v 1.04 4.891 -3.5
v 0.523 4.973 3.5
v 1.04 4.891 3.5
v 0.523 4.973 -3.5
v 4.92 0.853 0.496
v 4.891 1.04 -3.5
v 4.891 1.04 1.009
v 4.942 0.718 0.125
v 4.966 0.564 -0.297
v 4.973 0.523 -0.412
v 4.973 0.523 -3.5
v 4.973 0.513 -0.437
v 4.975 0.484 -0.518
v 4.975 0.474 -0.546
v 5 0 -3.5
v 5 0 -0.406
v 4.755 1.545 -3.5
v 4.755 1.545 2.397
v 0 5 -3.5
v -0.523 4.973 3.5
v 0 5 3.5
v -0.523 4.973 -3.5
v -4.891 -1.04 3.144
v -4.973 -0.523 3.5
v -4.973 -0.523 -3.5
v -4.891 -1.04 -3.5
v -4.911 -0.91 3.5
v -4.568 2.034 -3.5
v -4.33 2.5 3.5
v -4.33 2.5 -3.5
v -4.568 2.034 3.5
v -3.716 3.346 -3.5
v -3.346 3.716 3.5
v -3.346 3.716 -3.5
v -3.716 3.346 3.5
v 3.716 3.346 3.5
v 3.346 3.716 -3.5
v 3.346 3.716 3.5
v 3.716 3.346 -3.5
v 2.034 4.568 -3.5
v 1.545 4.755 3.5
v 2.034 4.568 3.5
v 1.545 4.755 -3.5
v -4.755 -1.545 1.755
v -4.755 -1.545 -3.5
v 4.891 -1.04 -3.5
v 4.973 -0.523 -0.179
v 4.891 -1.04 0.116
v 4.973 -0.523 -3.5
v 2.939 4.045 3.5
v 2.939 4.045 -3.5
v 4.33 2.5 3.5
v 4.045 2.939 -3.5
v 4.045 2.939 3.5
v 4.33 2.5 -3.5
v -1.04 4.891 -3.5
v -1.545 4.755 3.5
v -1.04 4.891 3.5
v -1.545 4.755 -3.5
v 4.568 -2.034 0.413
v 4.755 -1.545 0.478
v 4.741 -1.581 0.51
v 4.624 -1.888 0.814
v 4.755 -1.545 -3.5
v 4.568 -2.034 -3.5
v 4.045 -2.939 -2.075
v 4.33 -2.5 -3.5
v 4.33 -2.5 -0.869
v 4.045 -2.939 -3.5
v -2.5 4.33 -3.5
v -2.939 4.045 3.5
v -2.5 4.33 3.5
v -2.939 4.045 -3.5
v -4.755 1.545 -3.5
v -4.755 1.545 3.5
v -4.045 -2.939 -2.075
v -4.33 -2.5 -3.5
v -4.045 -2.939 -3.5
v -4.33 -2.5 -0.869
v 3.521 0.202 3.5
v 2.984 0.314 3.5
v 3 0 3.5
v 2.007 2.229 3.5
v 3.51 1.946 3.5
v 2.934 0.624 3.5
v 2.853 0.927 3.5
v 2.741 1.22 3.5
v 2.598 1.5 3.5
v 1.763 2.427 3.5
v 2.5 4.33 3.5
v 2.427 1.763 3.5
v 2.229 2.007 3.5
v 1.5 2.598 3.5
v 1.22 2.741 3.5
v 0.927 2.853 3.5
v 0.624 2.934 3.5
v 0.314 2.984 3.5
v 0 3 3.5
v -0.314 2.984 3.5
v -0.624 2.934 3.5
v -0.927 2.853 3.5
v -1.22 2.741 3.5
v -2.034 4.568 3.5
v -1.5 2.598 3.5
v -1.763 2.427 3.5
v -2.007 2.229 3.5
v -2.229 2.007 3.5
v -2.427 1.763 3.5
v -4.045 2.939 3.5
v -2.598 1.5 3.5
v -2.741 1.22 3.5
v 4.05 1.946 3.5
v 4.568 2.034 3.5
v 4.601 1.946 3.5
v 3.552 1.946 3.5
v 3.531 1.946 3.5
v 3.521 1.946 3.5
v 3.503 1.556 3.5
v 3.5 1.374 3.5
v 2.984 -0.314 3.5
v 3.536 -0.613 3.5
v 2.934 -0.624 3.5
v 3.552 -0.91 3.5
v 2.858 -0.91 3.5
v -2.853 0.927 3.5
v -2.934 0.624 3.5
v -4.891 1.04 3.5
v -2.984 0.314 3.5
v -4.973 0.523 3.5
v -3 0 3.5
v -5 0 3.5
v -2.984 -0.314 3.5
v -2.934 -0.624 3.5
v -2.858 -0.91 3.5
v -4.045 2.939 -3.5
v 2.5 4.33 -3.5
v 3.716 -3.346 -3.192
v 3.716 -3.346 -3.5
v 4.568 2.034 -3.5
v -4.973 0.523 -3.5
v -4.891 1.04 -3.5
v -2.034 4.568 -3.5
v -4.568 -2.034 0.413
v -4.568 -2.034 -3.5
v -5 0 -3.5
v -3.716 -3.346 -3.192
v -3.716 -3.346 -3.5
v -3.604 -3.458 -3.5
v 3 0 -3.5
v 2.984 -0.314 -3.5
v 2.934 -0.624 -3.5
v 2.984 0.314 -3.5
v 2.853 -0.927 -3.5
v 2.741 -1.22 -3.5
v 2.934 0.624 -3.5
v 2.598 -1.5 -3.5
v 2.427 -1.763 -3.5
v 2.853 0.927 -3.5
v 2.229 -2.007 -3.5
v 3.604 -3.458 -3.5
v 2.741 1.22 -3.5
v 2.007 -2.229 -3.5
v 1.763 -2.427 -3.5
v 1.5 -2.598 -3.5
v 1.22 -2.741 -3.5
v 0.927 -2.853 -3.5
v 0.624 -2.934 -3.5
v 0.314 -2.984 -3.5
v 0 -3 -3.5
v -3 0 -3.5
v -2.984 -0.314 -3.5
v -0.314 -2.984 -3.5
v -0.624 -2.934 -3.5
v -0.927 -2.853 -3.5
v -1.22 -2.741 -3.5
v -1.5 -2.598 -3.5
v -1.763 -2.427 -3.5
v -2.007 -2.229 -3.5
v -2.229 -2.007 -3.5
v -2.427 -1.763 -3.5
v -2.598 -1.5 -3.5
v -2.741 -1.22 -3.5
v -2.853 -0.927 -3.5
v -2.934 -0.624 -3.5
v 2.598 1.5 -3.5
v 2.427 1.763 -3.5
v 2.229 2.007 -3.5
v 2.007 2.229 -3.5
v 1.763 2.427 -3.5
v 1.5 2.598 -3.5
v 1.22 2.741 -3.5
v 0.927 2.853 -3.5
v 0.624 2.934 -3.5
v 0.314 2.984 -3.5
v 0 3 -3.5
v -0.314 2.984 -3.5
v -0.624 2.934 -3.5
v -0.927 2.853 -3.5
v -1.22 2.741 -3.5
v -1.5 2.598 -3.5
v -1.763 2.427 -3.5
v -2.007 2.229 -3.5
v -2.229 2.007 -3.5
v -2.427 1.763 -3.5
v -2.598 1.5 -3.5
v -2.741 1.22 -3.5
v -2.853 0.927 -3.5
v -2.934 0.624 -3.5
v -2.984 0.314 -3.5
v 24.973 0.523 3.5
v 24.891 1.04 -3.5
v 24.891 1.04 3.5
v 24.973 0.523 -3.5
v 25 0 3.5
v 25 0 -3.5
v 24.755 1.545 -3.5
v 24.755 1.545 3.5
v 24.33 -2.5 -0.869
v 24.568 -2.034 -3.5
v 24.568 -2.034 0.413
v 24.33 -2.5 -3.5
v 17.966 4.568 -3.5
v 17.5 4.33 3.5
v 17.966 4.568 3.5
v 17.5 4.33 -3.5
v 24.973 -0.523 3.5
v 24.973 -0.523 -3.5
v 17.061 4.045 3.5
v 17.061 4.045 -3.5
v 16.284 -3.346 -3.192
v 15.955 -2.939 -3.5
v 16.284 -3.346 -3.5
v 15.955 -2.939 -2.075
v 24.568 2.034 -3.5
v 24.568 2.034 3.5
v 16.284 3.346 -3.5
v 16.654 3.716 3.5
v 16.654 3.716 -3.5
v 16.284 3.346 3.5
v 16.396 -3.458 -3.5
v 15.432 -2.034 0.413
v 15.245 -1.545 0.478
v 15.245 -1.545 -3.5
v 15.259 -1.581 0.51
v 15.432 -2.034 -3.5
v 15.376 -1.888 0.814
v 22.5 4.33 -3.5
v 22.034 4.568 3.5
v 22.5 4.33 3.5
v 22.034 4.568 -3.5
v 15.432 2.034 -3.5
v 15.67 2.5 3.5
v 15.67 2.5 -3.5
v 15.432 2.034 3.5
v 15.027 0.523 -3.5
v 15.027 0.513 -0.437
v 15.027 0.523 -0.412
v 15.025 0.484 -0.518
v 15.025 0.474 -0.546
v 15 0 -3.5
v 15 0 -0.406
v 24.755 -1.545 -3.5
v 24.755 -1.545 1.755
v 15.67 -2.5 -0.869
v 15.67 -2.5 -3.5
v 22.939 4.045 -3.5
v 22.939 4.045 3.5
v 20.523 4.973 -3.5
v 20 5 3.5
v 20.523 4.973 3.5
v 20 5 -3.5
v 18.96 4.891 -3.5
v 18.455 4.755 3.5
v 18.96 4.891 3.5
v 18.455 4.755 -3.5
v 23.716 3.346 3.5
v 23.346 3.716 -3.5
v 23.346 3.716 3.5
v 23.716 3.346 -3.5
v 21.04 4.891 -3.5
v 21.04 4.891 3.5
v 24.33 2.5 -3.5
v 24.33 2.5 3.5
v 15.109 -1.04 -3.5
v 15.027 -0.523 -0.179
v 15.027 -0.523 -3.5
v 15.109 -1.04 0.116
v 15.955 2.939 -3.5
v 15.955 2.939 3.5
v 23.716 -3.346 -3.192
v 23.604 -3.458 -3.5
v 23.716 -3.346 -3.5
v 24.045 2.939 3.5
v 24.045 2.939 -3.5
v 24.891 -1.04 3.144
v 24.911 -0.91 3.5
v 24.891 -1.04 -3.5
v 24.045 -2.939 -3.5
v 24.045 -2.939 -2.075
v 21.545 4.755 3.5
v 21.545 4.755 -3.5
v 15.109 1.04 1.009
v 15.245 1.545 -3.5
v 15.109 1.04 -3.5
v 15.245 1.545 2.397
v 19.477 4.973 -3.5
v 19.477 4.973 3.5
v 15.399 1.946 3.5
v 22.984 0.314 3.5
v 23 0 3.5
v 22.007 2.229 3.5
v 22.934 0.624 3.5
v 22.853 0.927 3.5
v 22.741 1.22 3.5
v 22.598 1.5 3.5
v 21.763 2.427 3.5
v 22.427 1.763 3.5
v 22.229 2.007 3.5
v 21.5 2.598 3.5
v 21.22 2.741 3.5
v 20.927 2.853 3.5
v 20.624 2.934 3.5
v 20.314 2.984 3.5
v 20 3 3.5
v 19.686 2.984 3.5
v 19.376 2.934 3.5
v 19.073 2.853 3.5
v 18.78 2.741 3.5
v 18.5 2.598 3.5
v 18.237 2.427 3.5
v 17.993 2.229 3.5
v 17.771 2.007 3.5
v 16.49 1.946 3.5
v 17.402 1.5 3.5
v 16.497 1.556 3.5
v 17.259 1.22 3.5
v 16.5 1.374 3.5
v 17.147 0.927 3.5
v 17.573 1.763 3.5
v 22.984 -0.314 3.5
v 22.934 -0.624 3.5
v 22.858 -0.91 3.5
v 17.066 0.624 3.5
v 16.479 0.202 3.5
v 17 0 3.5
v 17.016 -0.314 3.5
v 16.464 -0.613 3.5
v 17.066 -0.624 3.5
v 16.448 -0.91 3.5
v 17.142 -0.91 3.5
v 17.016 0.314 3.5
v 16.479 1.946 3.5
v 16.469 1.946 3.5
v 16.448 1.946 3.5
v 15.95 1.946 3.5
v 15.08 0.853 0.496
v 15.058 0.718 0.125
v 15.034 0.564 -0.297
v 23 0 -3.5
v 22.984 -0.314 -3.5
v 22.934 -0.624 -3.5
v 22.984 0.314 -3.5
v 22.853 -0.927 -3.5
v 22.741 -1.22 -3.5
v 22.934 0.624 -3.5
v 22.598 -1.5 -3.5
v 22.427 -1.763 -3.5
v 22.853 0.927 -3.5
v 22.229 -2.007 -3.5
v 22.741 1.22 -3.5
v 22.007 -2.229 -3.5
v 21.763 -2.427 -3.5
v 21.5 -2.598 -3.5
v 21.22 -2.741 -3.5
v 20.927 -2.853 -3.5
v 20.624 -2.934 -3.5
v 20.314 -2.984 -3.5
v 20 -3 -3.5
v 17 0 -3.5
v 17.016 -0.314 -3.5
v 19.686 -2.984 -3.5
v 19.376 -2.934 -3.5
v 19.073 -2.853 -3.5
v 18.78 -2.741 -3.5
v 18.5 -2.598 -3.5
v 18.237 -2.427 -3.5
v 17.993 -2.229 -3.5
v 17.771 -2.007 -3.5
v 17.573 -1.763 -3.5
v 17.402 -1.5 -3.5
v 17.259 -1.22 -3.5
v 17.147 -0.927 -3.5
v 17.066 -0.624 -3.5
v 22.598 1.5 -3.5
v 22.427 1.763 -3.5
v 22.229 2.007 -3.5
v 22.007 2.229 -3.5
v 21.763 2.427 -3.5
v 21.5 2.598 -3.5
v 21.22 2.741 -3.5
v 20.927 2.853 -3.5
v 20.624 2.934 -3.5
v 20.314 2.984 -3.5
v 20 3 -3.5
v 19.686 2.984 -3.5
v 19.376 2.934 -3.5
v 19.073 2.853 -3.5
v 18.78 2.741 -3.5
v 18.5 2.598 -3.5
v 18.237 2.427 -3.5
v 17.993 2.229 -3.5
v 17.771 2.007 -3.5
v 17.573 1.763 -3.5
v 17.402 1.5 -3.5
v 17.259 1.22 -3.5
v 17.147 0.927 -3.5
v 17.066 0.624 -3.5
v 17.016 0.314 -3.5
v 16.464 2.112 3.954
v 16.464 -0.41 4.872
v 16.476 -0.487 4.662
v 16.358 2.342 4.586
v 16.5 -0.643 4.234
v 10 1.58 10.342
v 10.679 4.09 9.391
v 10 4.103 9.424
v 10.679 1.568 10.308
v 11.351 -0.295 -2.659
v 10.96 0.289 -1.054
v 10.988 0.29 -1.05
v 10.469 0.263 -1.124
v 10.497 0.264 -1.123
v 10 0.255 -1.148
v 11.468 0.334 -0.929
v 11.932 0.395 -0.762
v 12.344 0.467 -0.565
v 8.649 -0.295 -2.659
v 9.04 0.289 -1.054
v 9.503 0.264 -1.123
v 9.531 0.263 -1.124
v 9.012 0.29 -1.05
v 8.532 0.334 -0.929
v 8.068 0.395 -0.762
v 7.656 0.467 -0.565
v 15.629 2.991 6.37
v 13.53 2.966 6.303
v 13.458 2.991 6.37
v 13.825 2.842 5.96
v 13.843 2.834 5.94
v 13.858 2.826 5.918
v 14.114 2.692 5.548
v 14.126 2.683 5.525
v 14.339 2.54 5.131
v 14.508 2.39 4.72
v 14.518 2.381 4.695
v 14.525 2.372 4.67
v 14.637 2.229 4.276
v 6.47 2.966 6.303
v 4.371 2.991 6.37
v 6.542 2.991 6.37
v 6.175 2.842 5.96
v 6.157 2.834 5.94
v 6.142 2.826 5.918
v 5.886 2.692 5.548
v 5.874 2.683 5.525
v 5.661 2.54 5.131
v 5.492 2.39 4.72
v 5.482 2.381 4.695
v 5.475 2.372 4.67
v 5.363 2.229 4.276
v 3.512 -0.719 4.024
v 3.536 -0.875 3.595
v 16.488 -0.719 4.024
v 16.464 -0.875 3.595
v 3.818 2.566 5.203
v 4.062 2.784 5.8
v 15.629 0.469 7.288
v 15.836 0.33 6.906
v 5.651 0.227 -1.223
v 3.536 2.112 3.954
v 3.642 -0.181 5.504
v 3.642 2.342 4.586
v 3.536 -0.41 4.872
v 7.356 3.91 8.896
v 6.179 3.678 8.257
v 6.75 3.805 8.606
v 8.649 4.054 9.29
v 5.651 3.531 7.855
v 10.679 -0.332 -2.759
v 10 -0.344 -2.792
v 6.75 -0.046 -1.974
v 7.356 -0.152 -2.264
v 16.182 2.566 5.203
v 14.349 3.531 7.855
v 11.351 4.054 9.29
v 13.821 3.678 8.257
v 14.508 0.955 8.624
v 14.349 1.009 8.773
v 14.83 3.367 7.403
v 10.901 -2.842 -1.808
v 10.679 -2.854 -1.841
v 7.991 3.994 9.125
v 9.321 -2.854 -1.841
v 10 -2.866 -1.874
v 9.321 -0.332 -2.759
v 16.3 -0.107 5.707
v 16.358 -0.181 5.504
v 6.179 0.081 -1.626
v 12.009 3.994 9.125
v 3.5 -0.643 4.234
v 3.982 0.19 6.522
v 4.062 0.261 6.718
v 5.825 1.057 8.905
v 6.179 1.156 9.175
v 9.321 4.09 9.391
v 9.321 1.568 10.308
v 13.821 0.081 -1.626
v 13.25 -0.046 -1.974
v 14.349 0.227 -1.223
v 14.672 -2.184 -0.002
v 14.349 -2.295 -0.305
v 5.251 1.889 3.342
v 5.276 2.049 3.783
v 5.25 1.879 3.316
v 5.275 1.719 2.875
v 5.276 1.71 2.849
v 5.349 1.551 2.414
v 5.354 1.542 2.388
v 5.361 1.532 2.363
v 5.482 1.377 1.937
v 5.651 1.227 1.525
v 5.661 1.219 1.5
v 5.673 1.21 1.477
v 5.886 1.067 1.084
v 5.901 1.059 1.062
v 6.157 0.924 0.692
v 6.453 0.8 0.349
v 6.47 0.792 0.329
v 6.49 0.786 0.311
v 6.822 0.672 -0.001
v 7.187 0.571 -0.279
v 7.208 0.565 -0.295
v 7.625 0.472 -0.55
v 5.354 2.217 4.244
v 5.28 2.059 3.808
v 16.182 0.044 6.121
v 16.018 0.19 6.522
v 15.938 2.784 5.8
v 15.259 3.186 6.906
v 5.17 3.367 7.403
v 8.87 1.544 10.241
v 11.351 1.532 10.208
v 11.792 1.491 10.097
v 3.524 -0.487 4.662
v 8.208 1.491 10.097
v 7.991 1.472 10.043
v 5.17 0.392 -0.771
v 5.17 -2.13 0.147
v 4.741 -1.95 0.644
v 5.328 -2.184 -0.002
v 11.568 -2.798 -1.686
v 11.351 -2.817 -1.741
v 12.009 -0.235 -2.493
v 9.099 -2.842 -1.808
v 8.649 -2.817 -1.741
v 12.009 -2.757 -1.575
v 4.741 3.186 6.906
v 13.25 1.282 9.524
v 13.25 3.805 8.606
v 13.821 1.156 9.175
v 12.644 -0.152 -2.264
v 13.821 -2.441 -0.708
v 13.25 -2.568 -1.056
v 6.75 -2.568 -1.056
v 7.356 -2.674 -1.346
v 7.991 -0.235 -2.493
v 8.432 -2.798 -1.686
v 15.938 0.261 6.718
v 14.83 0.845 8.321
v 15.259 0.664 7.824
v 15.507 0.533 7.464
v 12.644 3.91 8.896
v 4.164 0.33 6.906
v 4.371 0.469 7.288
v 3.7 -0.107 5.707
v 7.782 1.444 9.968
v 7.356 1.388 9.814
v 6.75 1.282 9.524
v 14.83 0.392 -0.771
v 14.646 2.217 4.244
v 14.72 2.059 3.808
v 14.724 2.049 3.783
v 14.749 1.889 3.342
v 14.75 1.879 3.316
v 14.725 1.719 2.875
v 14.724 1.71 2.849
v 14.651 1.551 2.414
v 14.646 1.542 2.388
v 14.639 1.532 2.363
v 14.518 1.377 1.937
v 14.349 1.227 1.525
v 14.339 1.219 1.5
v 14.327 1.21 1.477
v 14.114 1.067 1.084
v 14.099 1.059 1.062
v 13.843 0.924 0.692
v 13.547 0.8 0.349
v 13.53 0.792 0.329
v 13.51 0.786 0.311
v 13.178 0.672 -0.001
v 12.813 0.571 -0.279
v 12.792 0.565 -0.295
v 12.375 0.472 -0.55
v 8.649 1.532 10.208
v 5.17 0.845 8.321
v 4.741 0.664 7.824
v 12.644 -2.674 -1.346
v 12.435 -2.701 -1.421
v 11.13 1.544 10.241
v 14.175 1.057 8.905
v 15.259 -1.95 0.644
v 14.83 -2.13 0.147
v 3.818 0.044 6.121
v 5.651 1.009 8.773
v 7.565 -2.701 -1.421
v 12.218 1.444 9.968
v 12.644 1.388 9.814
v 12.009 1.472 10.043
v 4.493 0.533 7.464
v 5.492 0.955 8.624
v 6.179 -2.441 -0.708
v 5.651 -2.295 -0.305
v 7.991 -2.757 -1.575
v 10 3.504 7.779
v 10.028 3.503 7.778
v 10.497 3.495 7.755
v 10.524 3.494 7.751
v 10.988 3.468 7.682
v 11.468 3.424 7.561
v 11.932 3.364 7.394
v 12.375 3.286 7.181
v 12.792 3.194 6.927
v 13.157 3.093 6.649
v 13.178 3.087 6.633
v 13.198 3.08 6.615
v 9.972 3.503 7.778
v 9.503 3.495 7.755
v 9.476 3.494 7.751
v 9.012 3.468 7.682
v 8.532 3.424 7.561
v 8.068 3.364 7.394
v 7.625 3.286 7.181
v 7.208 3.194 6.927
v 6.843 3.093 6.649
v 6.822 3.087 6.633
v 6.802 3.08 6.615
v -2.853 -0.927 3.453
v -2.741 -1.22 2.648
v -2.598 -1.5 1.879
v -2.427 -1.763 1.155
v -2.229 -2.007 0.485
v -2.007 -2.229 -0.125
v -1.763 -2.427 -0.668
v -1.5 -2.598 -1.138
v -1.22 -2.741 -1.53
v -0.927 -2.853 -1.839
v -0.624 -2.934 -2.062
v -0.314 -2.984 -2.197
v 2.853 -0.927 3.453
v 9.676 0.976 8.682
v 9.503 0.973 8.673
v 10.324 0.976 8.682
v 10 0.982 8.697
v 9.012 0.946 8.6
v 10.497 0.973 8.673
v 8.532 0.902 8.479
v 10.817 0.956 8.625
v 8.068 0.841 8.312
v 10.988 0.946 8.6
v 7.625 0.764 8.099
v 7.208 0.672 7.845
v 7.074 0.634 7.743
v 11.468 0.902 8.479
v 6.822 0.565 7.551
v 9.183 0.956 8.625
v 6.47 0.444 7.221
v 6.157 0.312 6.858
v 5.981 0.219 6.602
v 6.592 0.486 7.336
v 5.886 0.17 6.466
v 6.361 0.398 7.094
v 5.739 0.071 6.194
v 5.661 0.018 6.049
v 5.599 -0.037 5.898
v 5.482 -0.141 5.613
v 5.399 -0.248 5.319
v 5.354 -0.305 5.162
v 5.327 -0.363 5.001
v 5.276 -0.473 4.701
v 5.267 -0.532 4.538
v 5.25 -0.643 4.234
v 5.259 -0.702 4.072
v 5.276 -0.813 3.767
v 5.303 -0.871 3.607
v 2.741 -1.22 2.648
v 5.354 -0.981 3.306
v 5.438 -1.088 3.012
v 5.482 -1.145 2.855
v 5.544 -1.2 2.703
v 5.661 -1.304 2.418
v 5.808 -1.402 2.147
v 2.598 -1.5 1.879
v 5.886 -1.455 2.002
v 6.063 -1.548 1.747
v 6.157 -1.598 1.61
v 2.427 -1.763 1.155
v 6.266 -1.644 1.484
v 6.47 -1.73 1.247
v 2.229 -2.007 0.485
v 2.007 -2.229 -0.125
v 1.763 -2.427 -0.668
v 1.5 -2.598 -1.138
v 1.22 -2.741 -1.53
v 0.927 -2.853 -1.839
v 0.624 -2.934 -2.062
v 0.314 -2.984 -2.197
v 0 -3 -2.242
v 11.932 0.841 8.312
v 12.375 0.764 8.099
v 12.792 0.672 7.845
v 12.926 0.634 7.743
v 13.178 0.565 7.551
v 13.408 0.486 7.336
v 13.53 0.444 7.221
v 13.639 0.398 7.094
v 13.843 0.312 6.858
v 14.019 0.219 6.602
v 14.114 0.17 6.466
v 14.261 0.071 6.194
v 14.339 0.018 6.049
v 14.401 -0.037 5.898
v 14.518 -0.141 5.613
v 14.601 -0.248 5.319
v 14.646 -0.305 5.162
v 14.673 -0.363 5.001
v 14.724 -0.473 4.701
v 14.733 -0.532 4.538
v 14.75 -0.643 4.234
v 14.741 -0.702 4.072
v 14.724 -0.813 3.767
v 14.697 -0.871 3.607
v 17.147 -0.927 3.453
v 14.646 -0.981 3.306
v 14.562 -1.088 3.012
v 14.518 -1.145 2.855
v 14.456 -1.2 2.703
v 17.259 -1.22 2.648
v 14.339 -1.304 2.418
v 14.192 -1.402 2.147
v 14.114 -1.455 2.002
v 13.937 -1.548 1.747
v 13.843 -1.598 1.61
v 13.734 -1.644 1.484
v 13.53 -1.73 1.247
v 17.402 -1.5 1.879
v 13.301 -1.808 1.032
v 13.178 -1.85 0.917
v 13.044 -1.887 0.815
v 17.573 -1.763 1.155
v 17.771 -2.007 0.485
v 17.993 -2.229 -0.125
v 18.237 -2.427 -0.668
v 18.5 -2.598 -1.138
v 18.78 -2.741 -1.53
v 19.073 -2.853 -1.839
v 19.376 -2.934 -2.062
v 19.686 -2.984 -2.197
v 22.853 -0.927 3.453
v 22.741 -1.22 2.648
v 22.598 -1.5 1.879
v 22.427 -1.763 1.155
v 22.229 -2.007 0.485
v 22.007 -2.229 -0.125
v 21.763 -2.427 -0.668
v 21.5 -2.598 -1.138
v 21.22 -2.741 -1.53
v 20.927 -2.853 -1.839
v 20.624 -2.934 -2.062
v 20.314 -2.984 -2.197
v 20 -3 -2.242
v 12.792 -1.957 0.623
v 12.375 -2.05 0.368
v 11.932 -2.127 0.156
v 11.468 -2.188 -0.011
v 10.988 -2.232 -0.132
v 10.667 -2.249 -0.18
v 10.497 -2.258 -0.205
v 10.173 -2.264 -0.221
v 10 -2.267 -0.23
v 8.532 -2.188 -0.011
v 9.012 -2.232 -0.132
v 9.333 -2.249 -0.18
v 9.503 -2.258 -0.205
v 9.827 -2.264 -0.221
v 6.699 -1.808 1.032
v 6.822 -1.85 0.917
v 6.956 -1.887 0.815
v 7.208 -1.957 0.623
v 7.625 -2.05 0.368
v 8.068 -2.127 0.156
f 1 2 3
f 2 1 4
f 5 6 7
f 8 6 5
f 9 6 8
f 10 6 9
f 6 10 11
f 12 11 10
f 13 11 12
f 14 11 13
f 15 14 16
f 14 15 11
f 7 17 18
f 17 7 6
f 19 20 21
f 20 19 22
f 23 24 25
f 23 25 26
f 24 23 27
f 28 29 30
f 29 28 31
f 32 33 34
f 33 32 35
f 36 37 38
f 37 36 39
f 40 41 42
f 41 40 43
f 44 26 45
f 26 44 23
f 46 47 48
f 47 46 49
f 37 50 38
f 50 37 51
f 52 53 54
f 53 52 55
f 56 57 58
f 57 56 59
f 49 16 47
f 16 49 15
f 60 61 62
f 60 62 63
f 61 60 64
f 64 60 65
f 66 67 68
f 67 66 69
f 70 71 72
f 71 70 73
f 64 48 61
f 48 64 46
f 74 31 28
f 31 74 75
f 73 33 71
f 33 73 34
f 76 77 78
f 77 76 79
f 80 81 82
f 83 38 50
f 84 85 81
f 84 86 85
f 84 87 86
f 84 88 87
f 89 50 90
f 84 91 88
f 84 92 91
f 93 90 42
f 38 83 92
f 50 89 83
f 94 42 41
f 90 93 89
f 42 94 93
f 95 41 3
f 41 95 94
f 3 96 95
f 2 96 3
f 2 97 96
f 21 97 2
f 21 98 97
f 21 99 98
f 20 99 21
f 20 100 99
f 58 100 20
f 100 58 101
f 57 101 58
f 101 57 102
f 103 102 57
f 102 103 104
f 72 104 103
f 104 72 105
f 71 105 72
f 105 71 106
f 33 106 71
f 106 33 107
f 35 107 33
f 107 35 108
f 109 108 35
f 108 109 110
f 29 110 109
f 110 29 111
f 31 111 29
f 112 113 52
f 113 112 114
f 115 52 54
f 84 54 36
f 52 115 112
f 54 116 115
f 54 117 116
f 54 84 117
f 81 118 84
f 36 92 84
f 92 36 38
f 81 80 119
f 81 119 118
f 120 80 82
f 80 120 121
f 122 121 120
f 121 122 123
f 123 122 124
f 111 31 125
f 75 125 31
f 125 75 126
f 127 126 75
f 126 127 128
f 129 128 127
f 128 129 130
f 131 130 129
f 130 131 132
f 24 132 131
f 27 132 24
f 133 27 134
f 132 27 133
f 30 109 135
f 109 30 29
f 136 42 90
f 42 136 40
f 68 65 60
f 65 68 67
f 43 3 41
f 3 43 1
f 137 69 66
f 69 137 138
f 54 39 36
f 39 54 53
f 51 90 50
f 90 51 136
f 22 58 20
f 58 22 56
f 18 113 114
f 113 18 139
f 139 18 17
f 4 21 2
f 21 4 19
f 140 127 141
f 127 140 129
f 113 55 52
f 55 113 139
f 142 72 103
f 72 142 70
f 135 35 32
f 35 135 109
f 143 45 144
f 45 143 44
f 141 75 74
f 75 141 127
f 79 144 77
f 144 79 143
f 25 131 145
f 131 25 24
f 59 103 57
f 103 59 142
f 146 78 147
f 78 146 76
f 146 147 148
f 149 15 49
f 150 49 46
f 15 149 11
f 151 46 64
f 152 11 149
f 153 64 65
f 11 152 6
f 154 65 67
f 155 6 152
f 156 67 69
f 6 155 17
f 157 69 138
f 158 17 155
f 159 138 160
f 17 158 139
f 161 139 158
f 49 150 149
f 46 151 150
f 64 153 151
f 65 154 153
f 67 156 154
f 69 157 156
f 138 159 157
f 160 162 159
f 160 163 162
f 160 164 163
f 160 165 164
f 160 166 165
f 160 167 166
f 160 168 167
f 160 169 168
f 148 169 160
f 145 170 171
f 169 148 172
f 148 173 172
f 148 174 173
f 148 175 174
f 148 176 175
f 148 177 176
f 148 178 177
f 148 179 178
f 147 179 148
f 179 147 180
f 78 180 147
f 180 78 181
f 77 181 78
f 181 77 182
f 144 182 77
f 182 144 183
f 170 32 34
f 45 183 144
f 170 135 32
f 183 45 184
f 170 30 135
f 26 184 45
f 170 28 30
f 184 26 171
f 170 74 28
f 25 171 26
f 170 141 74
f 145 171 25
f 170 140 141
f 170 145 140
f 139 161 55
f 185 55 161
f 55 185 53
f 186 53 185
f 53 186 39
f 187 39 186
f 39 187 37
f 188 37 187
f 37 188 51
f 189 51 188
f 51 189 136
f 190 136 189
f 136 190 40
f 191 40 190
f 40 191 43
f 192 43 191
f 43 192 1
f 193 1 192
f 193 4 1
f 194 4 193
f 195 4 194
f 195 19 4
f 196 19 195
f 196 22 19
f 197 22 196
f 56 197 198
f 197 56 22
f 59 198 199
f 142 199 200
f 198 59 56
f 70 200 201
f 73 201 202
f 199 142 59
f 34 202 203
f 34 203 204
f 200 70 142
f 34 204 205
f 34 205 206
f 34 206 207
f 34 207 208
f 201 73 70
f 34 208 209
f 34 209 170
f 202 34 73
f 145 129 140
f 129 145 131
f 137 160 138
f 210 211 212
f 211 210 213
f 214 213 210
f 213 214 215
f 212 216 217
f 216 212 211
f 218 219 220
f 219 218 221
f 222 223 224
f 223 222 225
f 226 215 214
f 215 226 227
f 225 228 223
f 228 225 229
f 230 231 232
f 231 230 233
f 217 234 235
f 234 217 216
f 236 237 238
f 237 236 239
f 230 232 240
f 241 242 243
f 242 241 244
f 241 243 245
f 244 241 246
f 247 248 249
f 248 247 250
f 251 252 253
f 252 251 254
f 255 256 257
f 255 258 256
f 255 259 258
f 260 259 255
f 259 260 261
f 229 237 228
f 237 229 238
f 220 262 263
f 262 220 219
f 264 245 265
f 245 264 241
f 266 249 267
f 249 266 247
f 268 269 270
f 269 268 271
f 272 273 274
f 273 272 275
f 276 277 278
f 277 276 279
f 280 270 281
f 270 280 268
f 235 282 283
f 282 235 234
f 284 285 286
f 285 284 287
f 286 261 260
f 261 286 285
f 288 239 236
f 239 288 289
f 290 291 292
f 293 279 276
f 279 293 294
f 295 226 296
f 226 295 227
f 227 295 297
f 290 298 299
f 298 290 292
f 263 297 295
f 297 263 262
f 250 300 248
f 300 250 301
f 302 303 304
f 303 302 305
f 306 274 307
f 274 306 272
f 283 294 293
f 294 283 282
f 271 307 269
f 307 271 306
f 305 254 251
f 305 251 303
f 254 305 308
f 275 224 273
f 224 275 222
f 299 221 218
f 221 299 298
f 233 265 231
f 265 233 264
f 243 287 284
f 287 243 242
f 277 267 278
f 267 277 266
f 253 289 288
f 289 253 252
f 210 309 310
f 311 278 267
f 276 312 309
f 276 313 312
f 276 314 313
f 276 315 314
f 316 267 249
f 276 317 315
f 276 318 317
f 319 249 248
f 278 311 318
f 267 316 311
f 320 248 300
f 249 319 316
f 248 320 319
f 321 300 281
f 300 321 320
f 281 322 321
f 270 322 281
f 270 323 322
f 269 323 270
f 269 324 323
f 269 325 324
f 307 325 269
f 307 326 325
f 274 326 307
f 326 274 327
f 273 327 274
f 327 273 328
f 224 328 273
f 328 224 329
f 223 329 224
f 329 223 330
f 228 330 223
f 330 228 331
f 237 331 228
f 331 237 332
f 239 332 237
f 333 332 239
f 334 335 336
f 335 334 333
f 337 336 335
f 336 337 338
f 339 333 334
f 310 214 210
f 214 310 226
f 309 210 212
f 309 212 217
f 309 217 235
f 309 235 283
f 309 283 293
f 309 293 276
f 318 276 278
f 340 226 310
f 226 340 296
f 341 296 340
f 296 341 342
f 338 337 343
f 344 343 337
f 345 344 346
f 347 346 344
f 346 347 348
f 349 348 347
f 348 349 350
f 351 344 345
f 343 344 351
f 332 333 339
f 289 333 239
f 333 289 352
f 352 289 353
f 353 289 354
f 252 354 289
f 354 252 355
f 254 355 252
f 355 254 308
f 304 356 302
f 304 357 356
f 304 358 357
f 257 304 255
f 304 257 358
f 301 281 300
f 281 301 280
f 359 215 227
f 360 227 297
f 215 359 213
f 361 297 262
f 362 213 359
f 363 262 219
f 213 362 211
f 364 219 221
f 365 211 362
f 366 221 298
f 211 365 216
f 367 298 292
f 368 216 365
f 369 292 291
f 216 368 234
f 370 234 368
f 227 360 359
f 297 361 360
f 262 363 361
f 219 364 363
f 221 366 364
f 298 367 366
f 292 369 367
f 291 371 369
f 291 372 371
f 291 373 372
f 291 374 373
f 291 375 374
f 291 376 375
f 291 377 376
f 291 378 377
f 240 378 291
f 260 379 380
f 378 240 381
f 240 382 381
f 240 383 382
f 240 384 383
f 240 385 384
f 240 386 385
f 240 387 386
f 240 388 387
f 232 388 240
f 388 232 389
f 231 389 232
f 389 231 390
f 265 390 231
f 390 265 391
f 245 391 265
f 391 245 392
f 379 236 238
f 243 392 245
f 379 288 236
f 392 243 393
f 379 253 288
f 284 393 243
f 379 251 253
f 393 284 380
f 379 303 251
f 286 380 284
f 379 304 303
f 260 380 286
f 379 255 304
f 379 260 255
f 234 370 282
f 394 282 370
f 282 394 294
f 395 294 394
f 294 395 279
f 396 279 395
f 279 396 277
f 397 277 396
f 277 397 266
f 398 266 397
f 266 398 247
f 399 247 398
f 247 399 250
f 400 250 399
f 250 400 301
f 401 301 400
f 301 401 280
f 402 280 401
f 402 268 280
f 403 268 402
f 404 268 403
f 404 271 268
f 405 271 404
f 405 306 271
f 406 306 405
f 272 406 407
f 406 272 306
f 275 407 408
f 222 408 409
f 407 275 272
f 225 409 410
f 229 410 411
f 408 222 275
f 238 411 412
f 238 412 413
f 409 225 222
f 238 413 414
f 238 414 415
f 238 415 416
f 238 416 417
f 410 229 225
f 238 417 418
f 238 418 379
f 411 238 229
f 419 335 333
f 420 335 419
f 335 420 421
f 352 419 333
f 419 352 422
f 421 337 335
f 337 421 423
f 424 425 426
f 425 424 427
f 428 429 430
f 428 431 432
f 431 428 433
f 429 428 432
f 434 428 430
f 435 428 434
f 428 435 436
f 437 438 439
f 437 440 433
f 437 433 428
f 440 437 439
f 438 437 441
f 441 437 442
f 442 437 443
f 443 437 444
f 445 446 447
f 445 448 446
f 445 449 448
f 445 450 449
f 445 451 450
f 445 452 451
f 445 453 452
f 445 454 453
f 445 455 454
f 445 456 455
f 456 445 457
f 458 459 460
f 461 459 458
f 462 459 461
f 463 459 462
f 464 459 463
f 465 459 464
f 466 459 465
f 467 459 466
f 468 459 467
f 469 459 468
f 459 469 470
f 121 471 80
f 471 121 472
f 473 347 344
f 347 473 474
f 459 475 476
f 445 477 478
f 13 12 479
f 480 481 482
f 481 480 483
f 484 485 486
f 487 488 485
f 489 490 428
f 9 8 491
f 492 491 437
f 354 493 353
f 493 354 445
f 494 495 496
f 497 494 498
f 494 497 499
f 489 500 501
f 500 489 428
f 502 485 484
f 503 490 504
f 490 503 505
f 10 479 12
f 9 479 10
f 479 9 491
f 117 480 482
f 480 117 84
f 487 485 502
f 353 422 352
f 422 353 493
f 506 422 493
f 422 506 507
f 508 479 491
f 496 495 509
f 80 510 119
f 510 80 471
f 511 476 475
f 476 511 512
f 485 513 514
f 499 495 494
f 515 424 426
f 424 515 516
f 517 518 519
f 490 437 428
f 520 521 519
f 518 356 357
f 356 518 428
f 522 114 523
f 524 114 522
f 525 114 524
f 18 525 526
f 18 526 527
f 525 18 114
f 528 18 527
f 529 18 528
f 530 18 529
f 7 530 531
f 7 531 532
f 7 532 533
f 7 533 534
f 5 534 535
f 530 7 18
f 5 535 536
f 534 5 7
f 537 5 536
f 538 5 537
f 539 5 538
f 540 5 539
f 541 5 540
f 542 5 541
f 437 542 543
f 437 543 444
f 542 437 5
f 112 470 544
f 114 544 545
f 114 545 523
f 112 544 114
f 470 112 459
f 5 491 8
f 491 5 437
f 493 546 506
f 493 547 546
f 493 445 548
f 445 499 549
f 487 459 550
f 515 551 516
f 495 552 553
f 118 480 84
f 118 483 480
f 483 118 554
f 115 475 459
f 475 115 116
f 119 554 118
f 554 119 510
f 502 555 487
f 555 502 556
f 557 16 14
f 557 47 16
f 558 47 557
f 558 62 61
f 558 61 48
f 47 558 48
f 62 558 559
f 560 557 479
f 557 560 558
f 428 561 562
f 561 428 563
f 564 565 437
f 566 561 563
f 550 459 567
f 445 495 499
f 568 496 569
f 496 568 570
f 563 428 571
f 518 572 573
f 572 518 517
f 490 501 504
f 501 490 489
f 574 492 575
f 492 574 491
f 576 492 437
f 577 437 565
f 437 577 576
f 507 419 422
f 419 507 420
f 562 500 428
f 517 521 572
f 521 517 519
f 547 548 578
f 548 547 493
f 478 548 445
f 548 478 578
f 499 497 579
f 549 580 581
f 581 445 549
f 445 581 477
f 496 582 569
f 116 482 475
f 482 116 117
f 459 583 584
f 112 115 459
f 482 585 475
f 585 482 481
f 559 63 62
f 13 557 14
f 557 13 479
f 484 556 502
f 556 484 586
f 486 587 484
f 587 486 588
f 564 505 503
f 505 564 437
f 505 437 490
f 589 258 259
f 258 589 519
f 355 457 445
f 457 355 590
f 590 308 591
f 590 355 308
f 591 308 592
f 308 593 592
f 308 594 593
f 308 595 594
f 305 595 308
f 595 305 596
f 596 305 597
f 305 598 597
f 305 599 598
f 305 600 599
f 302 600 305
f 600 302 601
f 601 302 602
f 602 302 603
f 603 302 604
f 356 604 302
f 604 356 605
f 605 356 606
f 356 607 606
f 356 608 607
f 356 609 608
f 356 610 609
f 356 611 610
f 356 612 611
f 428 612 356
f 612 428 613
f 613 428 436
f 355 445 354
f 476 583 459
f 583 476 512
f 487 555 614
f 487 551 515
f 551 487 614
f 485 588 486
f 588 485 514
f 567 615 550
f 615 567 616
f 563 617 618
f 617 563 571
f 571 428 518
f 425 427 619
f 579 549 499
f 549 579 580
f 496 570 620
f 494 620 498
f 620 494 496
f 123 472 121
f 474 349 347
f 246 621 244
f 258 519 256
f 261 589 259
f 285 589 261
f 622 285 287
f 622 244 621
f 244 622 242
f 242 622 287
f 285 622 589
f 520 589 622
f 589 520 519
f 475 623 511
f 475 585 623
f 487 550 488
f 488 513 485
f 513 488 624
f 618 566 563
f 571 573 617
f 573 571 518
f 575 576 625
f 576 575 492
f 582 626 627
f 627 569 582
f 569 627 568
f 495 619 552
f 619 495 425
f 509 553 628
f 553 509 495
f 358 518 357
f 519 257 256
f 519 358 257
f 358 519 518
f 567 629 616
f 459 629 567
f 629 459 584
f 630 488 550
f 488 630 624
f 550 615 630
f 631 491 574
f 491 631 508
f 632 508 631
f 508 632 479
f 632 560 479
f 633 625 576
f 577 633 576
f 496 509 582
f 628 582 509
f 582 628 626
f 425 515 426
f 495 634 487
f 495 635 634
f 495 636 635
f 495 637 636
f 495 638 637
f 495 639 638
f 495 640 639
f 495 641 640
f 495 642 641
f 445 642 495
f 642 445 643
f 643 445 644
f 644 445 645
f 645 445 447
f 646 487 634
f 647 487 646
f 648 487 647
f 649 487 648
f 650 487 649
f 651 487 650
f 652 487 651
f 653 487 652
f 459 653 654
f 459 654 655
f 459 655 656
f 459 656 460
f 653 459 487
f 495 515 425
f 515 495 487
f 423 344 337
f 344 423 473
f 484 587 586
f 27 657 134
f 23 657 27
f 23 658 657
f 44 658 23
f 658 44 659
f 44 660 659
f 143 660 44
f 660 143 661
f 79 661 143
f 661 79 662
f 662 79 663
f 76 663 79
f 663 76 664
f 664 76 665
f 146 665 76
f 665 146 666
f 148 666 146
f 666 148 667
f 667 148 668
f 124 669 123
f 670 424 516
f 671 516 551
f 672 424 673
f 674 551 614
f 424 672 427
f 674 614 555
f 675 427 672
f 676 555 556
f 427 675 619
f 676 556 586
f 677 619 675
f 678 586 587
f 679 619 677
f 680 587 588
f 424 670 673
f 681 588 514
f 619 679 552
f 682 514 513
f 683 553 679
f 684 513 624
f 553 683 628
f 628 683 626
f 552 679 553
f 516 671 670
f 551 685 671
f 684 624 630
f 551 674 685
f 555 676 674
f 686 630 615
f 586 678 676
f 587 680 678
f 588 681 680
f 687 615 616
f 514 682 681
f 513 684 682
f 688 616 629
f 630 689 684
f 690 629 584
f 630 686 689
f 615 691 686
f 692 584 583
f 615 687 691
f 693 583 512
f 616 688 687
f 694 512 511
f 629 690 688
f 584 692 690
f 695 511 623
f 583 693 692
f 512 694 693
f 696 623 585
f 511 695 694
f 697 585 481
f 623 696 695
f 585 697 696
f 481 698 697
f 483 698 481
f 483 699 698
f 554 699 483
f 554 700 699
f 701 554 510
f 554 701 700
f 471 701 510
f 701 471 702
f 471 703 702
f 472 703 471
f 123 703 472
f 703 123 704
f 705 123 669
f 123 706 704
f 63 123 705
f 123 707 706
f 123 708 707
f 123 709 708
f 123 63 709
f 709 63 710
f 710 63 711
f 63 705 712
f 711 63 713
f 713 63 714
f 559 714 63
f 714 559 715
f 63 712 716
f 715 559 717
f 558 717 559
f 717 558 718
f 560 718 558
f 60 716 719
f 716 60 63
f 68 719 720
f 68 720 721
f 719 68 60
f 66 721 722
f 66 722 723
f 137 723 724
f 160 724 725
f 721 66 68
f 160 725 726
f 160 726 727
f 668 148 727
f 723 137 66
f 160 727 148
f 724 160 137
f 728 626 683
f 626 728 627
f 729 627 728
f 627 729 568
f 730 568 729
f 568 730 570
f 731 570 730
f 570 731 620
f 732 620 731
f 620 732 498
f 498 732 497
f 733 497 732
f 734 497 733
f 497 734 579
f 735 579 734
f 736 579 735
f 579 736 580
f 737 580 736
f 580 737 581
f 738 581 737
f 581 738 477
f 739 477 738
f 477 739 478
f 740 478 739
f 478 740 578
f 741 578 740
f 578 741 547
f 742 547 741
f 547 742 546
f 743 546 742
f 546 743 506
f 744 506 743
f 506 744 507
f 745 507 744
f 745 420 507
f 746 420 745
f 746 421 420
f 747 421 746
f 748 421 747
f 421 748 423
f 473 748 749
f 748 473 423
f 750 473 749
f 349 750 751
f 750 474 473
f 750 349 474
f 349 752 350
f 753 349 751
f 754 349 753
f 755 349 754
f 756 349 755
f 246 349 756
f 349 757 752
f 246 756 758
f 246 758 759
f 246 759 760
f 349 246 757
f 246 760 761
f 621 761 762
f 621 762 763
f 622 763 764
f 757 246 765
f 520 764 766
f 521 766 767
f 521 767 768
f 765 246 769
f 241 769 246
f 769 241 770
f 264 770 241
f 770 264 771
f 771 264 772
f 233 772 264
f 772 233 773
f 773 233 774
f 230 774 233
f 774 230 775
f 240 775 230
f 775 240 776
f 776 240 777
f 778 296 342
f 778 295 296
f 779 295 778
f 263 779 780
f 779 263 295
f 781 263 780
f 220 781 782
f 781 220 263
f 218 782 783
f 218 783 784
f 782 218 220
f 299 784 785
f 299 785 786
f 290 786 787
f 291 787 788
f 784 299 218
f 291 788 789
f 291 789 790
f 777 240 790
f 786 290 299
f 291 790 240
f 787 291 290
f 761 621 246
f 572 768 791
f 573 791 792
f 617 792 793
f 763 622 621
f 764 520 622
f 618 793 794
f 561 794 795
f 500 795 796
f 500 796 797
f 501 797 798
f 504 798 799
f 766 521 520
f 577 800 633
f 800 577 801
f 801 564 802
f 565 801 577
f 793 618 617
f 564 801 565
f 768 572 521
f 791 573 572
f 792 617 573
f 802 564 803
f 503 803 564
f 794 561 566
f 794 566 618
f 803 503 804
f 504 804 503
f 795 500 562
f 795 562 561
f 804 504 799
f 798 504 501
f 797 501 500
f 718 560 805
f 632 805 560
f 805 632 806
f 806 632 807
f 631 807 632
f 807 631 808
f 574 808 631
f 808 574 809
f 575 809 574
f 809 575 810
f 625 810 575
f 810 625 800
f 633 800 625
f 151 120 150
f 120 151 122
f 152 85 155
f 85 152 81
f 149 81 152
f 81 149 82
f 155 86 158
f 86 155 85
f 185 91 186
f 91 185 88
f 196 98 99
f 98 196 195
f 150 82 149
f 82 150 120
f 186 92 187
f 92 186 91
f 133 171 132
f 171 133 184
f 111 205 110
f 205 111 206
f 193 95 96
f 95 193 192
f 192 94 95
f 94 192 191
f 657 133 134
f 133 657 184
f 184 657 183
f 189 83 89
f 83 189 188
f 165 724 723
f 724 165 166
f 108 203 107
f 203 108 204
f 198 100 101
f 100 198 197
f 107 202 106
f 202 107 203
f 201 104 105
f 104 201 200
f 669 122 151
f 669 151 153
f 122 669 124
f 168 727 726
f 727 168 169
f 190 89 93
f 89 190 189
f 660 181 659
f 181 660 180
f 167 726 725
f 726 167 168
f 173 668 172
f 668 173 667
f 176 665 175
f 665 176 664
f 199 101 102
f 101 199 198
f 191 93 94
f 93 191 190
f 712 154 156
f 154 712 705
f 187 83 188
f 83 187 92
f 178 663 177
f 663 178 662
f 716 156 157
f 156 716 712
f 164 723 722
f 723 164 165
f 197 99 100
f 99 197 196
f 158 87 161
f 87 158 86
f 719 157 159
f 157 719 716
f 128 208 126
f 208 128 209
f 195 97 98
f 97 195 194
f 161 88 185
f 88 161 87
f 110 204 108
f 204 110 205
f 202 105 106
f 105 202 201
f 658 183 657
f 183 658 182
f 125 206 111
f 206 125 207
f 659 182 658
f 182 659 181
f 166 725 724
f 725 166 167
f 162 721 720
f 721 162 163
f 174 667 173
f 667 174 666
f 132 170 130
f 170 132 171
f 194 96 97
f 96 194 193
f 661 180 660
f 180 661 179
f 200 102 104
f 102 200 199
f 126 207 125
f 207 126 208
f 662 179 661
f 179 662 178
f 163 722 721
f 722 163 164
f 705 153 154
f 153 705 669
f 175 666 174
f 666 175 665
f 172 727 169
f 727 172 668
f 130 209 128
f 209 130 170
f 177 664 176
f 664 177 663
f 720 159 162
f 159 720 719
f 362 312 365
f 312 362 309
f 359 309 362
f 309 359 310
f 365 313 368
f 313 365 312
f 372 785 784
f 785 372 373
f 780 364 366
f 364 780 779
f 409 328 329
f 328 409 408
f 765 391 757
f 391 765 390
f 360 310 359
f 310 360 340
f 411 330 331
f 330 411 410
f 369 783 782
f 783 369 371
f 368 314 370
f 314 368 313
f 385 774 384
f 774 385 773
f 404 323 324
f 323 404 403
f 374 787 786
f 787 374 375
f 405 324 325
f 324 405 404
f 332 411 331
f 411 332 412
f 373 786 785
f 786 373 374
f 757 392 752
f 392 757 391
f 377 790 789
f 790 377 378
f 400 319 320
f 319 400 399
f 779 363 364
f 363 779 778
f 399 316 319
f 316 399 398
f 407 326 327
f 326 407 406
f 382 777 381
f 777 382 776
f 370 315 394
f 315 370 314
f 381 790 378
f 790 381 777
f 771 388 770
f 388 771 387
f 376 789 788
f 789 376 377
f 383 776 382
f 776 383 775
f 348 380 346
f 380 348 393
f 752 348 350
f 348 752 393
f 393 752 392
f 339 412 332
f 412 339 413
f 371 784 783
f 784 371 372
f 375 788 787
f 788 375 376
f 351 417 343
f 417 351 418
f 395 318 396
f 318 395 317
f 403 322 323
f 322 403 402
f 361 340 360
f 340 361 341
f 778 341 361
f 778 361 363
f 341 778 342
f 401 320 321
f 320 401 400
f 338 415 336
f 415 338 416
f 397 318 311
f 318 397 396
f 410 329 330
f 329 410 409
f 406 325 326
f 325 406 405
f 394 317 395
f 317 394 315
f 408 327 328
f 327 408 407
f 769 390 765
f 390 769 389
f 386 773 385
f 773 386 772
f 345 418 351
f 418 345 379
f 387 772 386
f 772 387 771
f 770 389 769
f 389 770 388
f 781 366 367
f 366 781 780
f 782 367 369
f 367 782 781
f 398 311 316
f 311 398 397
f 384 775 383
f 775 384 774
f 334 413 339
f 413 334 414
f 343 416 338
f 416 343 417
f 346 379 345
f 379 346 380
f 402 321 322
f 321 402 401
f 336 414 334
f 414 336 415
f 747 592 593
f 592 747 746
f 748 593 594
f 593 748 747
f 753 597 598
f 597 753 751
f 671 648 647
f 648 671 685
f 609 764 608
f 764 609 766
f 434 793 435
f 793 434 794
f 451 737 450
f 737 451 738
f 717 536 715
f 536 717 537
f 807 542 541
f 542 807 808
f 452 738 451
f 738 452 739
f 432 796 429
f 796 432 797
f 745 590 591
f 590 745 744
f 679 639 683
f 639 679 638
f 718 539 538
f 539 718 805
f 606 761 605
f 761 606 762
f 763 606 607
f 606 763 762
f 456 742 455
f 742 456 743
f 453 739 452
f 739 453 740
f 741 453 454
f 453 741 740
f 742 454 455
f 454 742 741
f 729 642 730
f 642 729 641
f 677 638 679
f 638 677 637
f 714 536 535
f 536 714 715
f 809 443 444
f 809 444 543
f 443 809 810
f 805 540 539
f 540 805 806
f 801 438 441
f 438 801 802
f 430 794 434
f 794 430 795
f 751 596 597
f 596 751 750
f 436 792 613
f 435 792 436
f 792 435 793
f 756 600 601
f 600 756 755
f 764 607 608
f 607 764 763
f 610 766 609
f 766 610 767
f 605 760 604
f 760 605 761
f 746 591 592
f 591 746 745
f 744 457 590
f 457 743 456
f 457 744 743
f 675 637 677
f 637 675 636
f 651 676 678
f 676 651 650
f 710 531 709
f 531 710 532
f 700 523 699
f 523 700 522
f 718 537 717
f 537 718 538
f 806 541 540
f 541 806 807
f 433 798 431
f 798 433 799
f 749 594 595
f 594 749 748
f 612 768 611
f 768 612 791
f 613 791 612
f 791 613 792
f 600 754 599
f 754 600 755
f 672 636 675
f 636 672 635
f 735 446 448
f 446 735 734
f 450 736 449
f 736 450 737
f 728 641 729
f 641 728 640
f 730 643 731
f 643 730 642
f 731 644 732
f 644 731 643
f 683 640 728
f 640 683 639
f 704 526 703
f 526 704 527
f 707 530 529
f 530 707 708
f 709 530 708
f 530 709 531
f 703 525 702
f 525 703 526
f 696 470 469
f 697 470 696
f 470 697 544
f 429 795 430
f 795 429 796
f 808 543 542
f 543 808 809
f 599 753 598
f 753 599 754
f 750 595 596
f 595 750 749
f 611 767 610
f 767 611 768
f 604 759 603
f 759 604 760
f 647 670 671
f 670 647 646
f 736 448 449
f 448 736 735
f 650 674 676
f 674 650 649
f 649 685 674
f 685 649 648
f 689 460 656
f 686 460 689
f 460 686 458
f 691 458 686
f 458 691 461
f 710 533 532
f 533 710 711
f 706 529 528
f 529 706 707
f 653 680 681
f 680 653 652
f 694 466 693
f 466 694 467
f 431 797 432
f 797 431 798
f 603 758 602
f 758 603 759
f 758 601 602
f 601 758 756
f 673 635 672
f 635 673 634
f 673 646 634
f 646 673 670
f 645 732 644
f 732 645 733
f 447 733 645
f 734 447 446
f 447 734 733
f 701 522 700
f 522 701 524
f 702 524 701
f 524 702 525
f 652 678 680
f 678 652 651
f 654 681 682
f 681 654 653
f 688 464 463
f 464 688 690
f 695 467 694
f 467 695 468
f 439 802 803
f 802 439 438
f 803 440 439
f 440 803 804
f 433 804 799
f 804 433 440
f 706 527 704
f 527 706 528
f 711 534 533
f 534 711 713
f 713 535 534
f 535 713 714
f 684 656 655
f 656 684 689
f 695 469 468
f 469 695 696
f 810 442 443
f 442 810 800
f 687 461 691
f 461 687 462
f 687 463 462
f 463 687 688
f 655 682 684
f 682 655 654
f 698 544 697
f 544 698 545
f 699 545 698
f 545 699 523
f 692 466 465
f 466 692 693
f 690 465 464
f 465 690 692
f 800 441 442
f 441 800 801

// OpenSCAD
//U120 Cam mount
//Designed based on the original one but from scratch and customizable

cam_angle=20;
cam_height=4;
cam_hole=9.5;
cam_offset_y=0;
cam_width=13;

cut=0.5;
cutout_size=30;

$fn=60;


//U120
standoff_height=7;
standoff_width=10;
standoff_hole=6;
standoff_distance=20;

cam_offset_z=cam_height*0.5+2;
total_height=15;

difference() {
    union() {
        //left standoff
        cylinder(d=standoff_width,h=standoff_height,center=true);
        //rightstandoff
        translate([standoff_distance,0,0])
            cylinder(d=standoff_width,h=standoff_height,center=true);
            
        //cam
        translate([standoff_distance*0.5,cam_offset_y,cam_offset_z])
            rotate([90-cam_angle,0,0])
                cylinder(d=cam_width,h=cam_height,center=true);

    }

    union() {
        //cut out angle for printing
        translate([-standoff_width,cam_offset_y,cam_height*0.5+cam_offset_z])
            rotate([90-cam_angle,0,0])
                translate([0,-cutout_size*0.5,0])
                    cube([standoff_distance*2,cutout_size,20],center=false);
        
        //holes
        
        //left standoff
        cylinder(d=standoff_hole,h=standoff_height+cut,center=true);
        
        //right standoff
        translate([standoff_distance,0,0])
            cylinder(d=standoff_hole,h=standoff_height+cut,center=true);
            
        //cam
        translate([standoff_distance*0.5,cam_offset_y,cam_offset_z])
            rotate([90-cam_angle,0,0])
                cylinder(d=cam_hole,h=cam_height+cut,center=true);
    }
}
